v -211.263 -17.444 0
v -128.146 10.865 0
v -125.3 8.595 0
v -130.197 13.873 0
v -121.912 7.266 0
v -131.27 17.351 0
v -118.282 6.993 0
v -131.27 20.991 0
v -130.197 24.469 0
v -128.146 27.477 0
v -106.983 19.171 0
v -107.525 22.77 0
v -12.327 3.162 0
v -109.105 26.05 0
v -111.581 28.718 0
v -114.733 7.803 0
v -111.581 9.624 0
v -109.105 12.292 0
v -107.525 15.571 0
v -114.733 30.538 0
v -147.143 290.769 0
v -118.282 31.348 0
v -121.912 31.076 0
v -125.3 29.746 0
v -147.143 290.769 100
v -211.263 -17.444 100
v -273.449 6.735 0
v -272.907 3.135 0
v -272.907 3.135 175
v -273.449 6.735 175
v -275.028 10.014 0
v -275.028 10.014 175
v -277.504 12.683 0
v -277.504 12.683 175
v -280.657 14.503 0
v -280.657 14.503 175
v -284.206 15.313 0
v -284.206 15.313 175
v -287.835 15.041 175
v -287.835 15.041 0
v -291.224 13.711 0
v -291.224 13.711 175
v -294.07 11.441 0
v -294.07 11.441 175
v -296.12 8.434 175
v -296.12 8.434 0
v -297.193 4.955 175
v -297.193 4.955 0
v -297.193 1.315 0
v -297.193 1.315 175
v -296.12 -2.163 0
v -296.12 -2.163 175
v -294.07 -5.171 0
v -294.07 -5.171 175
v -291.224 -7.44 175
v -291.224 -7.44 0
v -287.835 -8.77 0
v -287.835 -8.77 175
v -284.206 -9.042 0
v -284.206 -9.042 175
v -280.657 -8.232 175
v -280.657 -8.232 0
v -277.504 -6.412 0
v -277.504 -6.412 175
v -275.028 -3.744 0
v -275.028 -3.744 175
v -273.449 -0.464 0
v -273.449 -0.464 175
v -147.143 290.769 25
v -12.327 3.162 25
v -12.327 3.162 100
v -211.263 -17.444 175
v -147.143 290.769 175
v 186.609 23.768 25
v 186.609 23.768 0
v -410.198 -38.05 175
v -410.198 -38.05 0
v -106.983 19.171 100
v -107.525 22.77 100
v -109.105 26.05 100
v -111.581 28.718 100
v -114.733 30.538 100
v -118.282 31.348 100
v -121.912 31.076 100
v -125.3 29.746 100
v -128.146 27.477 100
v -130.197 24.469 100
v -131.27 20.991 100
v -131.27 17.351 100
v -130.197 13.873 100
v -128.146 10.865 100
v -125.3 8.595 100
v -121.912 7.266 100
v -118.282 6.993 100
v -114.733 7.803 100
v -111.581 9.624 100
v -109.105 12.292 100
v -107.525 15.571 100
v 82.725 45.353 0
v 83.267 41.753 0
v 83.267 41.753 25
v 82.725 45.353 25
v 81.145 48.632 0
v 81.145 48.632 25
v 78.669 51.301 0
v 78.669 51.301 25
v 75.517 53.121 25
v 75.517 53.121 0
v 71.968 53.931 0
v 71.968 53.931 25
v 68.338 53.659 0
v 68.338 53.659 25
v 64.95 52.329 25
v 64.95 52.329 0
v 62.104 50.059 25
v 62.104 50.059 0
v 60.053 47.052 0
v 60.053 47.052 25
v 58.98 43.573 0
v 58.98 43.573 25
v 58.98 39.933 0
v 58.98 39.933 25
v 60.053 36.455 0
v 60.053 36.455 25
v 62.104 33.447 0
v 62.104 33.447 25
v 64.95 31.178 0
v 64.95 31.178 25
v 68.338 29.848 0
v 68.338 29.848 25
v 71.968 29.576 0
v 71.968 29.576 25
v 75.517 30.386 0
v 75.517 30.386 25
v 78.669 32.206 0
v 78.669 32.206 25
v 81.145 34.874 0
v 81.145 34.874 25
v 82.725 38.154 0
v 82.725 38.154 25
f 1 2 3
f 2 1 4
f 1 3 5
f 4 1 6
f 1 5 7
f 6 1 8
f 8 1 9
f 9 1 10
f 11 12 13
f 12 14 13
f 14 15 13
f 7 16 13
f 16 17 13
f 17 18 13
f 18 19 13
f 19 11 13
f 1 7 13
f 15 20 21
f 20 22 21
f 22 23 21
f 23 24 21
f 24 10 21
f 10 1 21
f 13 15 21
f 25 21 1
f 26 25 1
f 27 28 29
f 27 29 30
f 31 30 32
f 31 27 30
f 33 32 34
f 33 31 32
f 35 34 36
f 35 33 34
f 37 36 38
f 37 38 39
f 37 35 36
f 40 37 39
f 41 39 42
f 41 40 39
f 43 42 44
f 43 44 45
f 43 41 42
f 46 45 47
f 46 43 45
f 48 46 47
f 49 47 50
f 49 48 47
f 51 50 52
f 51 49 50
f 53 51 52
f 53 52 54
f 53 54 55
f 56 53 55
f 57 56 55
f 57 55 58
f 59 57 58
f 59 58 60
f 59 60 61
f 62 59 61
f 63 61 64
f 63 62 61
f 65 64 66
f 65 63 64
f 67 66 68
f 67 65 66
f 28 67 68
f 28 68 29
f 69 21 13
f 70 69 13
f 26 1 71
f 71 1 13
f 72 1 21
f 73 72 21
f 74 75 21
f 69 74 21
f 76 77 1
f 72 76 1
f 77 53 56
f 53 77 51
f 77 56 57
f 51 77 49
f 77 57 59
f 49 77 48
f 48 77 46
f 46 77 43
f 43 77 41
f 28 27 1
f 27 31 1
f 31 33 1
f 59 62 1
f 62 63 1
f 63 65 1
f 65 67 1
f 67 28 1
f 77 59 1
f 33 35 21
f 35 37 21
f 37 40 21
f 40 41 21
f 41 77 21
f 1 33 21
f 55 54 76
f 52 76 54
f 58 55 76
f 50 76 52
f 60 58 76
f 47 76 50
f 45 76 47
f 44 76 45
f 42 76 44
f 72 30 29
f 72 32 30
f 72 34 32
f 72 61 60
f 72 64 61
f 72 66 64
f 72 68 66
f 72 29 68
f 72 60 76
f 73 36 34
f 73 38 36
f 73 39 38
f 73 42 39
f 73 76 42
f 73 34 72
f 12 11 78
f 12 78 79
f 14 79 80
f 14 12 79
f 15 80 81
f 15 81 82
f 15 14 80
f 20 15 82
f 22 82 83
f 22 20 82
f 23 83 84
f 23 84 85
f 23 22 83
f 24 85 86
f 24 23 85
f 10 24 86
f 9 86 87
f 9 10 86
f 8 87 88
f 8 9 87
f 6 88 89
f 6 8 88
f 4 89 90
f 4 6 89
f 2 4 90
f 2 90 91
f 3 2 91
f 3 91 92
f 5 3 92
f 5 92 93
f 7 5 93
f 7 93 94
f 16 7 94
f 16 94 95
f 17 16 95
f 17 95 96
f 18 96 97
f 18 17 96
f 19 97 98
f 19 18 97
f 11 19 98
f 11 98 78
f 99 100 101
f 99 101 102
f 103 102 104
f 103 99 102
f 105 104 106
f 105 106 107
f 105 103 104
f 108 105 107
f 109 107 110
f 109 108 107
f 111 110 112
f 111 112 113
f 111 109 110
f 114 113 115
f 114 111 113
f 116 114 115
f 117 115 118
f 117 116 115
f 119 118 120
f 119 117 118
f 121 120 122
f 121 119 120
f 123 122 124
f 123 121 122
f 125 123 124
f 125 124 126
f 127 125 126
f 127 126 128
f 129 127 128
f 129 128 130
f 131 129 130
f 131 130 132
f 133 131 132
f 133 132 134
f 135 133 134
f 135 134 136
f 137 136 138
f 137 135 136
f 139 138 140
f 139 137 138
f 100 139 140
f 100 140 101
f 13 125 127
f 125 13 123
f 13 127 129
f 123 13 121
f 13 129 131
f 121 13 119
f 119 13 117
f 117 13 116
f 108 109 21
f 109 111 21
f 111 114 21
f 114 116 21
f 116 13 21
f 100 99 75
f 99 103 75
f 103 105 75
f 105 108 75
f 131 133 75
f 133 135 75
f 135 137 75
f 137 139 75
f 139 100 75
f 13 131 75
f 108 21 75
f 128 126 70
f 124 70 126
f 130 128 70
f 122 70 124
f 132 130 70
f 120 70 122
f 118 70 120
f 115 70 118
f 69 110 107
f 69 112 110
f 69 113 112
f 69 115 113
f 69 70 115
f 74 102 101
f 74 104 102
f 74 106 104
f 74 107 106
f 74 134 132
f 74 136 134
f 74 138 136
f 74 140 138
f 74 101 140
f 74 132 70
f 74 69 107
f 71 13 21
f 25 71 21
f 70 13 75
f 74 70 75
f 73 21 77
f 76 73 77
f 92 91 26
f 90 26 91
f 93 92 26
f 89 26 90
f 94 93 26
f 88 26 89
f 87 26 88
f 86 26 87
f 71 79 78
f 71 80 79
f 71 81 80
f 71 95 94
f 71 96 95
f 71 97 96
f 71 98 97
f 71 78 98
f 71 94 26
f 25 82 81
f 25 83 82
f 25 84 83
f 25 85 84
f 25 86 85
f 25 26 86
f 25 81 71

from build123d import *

# Parameters (mm, degrees)
F0_R     = 12.21157
F1_DEPTH = 175
F2_DEPTH = 25
F3_DEPTH = 100


with BuildPart() as f1:
    # F0 (on Top) → F1 (new body)
    with BuildSketch(Plane.XY):
        Polygon((-211.262774, -17.443784), (-147.143358, 290.769314), (-410.198446, -38.049573), align=None)
        with Locations((-285.118103, 3.135384)):
            Circle(F0_R, mode=Mode.SUBTRACT)
    extrude(amount=F1_DEPTH)


with BuildPart() as f2:
    # F0 (on Top) → F2 (new body)
    with BuildSketch(Plane.XY):
        Polygon((186.608569, 23.767795), (-147.143358, 290.769314), (-12.327103, 3.162005), align=None)
        with Locations((71.055464, 41.753434)):
            Circle(F0_R, mode=Mode.SUBTRACT)
    extrude(amount=F2_DEPTH)


with BuildPart() as f3:
    # F0 (on Top) → F3 (new body)
    with BuildSketch(Plane.XY):
        Polygon((-12.327103, 3.162005), (-147.143358, 290.769314), (-211.262774, -17.443784), align=None)
        with Locations((-119.194433, 19.170908)):
            Circle(F0_R, mode=Mode.SUBTRACT)
    extrude(amount=F3_DEPTH)


solid = Compound([f1.part, f2.part, f3.part])
